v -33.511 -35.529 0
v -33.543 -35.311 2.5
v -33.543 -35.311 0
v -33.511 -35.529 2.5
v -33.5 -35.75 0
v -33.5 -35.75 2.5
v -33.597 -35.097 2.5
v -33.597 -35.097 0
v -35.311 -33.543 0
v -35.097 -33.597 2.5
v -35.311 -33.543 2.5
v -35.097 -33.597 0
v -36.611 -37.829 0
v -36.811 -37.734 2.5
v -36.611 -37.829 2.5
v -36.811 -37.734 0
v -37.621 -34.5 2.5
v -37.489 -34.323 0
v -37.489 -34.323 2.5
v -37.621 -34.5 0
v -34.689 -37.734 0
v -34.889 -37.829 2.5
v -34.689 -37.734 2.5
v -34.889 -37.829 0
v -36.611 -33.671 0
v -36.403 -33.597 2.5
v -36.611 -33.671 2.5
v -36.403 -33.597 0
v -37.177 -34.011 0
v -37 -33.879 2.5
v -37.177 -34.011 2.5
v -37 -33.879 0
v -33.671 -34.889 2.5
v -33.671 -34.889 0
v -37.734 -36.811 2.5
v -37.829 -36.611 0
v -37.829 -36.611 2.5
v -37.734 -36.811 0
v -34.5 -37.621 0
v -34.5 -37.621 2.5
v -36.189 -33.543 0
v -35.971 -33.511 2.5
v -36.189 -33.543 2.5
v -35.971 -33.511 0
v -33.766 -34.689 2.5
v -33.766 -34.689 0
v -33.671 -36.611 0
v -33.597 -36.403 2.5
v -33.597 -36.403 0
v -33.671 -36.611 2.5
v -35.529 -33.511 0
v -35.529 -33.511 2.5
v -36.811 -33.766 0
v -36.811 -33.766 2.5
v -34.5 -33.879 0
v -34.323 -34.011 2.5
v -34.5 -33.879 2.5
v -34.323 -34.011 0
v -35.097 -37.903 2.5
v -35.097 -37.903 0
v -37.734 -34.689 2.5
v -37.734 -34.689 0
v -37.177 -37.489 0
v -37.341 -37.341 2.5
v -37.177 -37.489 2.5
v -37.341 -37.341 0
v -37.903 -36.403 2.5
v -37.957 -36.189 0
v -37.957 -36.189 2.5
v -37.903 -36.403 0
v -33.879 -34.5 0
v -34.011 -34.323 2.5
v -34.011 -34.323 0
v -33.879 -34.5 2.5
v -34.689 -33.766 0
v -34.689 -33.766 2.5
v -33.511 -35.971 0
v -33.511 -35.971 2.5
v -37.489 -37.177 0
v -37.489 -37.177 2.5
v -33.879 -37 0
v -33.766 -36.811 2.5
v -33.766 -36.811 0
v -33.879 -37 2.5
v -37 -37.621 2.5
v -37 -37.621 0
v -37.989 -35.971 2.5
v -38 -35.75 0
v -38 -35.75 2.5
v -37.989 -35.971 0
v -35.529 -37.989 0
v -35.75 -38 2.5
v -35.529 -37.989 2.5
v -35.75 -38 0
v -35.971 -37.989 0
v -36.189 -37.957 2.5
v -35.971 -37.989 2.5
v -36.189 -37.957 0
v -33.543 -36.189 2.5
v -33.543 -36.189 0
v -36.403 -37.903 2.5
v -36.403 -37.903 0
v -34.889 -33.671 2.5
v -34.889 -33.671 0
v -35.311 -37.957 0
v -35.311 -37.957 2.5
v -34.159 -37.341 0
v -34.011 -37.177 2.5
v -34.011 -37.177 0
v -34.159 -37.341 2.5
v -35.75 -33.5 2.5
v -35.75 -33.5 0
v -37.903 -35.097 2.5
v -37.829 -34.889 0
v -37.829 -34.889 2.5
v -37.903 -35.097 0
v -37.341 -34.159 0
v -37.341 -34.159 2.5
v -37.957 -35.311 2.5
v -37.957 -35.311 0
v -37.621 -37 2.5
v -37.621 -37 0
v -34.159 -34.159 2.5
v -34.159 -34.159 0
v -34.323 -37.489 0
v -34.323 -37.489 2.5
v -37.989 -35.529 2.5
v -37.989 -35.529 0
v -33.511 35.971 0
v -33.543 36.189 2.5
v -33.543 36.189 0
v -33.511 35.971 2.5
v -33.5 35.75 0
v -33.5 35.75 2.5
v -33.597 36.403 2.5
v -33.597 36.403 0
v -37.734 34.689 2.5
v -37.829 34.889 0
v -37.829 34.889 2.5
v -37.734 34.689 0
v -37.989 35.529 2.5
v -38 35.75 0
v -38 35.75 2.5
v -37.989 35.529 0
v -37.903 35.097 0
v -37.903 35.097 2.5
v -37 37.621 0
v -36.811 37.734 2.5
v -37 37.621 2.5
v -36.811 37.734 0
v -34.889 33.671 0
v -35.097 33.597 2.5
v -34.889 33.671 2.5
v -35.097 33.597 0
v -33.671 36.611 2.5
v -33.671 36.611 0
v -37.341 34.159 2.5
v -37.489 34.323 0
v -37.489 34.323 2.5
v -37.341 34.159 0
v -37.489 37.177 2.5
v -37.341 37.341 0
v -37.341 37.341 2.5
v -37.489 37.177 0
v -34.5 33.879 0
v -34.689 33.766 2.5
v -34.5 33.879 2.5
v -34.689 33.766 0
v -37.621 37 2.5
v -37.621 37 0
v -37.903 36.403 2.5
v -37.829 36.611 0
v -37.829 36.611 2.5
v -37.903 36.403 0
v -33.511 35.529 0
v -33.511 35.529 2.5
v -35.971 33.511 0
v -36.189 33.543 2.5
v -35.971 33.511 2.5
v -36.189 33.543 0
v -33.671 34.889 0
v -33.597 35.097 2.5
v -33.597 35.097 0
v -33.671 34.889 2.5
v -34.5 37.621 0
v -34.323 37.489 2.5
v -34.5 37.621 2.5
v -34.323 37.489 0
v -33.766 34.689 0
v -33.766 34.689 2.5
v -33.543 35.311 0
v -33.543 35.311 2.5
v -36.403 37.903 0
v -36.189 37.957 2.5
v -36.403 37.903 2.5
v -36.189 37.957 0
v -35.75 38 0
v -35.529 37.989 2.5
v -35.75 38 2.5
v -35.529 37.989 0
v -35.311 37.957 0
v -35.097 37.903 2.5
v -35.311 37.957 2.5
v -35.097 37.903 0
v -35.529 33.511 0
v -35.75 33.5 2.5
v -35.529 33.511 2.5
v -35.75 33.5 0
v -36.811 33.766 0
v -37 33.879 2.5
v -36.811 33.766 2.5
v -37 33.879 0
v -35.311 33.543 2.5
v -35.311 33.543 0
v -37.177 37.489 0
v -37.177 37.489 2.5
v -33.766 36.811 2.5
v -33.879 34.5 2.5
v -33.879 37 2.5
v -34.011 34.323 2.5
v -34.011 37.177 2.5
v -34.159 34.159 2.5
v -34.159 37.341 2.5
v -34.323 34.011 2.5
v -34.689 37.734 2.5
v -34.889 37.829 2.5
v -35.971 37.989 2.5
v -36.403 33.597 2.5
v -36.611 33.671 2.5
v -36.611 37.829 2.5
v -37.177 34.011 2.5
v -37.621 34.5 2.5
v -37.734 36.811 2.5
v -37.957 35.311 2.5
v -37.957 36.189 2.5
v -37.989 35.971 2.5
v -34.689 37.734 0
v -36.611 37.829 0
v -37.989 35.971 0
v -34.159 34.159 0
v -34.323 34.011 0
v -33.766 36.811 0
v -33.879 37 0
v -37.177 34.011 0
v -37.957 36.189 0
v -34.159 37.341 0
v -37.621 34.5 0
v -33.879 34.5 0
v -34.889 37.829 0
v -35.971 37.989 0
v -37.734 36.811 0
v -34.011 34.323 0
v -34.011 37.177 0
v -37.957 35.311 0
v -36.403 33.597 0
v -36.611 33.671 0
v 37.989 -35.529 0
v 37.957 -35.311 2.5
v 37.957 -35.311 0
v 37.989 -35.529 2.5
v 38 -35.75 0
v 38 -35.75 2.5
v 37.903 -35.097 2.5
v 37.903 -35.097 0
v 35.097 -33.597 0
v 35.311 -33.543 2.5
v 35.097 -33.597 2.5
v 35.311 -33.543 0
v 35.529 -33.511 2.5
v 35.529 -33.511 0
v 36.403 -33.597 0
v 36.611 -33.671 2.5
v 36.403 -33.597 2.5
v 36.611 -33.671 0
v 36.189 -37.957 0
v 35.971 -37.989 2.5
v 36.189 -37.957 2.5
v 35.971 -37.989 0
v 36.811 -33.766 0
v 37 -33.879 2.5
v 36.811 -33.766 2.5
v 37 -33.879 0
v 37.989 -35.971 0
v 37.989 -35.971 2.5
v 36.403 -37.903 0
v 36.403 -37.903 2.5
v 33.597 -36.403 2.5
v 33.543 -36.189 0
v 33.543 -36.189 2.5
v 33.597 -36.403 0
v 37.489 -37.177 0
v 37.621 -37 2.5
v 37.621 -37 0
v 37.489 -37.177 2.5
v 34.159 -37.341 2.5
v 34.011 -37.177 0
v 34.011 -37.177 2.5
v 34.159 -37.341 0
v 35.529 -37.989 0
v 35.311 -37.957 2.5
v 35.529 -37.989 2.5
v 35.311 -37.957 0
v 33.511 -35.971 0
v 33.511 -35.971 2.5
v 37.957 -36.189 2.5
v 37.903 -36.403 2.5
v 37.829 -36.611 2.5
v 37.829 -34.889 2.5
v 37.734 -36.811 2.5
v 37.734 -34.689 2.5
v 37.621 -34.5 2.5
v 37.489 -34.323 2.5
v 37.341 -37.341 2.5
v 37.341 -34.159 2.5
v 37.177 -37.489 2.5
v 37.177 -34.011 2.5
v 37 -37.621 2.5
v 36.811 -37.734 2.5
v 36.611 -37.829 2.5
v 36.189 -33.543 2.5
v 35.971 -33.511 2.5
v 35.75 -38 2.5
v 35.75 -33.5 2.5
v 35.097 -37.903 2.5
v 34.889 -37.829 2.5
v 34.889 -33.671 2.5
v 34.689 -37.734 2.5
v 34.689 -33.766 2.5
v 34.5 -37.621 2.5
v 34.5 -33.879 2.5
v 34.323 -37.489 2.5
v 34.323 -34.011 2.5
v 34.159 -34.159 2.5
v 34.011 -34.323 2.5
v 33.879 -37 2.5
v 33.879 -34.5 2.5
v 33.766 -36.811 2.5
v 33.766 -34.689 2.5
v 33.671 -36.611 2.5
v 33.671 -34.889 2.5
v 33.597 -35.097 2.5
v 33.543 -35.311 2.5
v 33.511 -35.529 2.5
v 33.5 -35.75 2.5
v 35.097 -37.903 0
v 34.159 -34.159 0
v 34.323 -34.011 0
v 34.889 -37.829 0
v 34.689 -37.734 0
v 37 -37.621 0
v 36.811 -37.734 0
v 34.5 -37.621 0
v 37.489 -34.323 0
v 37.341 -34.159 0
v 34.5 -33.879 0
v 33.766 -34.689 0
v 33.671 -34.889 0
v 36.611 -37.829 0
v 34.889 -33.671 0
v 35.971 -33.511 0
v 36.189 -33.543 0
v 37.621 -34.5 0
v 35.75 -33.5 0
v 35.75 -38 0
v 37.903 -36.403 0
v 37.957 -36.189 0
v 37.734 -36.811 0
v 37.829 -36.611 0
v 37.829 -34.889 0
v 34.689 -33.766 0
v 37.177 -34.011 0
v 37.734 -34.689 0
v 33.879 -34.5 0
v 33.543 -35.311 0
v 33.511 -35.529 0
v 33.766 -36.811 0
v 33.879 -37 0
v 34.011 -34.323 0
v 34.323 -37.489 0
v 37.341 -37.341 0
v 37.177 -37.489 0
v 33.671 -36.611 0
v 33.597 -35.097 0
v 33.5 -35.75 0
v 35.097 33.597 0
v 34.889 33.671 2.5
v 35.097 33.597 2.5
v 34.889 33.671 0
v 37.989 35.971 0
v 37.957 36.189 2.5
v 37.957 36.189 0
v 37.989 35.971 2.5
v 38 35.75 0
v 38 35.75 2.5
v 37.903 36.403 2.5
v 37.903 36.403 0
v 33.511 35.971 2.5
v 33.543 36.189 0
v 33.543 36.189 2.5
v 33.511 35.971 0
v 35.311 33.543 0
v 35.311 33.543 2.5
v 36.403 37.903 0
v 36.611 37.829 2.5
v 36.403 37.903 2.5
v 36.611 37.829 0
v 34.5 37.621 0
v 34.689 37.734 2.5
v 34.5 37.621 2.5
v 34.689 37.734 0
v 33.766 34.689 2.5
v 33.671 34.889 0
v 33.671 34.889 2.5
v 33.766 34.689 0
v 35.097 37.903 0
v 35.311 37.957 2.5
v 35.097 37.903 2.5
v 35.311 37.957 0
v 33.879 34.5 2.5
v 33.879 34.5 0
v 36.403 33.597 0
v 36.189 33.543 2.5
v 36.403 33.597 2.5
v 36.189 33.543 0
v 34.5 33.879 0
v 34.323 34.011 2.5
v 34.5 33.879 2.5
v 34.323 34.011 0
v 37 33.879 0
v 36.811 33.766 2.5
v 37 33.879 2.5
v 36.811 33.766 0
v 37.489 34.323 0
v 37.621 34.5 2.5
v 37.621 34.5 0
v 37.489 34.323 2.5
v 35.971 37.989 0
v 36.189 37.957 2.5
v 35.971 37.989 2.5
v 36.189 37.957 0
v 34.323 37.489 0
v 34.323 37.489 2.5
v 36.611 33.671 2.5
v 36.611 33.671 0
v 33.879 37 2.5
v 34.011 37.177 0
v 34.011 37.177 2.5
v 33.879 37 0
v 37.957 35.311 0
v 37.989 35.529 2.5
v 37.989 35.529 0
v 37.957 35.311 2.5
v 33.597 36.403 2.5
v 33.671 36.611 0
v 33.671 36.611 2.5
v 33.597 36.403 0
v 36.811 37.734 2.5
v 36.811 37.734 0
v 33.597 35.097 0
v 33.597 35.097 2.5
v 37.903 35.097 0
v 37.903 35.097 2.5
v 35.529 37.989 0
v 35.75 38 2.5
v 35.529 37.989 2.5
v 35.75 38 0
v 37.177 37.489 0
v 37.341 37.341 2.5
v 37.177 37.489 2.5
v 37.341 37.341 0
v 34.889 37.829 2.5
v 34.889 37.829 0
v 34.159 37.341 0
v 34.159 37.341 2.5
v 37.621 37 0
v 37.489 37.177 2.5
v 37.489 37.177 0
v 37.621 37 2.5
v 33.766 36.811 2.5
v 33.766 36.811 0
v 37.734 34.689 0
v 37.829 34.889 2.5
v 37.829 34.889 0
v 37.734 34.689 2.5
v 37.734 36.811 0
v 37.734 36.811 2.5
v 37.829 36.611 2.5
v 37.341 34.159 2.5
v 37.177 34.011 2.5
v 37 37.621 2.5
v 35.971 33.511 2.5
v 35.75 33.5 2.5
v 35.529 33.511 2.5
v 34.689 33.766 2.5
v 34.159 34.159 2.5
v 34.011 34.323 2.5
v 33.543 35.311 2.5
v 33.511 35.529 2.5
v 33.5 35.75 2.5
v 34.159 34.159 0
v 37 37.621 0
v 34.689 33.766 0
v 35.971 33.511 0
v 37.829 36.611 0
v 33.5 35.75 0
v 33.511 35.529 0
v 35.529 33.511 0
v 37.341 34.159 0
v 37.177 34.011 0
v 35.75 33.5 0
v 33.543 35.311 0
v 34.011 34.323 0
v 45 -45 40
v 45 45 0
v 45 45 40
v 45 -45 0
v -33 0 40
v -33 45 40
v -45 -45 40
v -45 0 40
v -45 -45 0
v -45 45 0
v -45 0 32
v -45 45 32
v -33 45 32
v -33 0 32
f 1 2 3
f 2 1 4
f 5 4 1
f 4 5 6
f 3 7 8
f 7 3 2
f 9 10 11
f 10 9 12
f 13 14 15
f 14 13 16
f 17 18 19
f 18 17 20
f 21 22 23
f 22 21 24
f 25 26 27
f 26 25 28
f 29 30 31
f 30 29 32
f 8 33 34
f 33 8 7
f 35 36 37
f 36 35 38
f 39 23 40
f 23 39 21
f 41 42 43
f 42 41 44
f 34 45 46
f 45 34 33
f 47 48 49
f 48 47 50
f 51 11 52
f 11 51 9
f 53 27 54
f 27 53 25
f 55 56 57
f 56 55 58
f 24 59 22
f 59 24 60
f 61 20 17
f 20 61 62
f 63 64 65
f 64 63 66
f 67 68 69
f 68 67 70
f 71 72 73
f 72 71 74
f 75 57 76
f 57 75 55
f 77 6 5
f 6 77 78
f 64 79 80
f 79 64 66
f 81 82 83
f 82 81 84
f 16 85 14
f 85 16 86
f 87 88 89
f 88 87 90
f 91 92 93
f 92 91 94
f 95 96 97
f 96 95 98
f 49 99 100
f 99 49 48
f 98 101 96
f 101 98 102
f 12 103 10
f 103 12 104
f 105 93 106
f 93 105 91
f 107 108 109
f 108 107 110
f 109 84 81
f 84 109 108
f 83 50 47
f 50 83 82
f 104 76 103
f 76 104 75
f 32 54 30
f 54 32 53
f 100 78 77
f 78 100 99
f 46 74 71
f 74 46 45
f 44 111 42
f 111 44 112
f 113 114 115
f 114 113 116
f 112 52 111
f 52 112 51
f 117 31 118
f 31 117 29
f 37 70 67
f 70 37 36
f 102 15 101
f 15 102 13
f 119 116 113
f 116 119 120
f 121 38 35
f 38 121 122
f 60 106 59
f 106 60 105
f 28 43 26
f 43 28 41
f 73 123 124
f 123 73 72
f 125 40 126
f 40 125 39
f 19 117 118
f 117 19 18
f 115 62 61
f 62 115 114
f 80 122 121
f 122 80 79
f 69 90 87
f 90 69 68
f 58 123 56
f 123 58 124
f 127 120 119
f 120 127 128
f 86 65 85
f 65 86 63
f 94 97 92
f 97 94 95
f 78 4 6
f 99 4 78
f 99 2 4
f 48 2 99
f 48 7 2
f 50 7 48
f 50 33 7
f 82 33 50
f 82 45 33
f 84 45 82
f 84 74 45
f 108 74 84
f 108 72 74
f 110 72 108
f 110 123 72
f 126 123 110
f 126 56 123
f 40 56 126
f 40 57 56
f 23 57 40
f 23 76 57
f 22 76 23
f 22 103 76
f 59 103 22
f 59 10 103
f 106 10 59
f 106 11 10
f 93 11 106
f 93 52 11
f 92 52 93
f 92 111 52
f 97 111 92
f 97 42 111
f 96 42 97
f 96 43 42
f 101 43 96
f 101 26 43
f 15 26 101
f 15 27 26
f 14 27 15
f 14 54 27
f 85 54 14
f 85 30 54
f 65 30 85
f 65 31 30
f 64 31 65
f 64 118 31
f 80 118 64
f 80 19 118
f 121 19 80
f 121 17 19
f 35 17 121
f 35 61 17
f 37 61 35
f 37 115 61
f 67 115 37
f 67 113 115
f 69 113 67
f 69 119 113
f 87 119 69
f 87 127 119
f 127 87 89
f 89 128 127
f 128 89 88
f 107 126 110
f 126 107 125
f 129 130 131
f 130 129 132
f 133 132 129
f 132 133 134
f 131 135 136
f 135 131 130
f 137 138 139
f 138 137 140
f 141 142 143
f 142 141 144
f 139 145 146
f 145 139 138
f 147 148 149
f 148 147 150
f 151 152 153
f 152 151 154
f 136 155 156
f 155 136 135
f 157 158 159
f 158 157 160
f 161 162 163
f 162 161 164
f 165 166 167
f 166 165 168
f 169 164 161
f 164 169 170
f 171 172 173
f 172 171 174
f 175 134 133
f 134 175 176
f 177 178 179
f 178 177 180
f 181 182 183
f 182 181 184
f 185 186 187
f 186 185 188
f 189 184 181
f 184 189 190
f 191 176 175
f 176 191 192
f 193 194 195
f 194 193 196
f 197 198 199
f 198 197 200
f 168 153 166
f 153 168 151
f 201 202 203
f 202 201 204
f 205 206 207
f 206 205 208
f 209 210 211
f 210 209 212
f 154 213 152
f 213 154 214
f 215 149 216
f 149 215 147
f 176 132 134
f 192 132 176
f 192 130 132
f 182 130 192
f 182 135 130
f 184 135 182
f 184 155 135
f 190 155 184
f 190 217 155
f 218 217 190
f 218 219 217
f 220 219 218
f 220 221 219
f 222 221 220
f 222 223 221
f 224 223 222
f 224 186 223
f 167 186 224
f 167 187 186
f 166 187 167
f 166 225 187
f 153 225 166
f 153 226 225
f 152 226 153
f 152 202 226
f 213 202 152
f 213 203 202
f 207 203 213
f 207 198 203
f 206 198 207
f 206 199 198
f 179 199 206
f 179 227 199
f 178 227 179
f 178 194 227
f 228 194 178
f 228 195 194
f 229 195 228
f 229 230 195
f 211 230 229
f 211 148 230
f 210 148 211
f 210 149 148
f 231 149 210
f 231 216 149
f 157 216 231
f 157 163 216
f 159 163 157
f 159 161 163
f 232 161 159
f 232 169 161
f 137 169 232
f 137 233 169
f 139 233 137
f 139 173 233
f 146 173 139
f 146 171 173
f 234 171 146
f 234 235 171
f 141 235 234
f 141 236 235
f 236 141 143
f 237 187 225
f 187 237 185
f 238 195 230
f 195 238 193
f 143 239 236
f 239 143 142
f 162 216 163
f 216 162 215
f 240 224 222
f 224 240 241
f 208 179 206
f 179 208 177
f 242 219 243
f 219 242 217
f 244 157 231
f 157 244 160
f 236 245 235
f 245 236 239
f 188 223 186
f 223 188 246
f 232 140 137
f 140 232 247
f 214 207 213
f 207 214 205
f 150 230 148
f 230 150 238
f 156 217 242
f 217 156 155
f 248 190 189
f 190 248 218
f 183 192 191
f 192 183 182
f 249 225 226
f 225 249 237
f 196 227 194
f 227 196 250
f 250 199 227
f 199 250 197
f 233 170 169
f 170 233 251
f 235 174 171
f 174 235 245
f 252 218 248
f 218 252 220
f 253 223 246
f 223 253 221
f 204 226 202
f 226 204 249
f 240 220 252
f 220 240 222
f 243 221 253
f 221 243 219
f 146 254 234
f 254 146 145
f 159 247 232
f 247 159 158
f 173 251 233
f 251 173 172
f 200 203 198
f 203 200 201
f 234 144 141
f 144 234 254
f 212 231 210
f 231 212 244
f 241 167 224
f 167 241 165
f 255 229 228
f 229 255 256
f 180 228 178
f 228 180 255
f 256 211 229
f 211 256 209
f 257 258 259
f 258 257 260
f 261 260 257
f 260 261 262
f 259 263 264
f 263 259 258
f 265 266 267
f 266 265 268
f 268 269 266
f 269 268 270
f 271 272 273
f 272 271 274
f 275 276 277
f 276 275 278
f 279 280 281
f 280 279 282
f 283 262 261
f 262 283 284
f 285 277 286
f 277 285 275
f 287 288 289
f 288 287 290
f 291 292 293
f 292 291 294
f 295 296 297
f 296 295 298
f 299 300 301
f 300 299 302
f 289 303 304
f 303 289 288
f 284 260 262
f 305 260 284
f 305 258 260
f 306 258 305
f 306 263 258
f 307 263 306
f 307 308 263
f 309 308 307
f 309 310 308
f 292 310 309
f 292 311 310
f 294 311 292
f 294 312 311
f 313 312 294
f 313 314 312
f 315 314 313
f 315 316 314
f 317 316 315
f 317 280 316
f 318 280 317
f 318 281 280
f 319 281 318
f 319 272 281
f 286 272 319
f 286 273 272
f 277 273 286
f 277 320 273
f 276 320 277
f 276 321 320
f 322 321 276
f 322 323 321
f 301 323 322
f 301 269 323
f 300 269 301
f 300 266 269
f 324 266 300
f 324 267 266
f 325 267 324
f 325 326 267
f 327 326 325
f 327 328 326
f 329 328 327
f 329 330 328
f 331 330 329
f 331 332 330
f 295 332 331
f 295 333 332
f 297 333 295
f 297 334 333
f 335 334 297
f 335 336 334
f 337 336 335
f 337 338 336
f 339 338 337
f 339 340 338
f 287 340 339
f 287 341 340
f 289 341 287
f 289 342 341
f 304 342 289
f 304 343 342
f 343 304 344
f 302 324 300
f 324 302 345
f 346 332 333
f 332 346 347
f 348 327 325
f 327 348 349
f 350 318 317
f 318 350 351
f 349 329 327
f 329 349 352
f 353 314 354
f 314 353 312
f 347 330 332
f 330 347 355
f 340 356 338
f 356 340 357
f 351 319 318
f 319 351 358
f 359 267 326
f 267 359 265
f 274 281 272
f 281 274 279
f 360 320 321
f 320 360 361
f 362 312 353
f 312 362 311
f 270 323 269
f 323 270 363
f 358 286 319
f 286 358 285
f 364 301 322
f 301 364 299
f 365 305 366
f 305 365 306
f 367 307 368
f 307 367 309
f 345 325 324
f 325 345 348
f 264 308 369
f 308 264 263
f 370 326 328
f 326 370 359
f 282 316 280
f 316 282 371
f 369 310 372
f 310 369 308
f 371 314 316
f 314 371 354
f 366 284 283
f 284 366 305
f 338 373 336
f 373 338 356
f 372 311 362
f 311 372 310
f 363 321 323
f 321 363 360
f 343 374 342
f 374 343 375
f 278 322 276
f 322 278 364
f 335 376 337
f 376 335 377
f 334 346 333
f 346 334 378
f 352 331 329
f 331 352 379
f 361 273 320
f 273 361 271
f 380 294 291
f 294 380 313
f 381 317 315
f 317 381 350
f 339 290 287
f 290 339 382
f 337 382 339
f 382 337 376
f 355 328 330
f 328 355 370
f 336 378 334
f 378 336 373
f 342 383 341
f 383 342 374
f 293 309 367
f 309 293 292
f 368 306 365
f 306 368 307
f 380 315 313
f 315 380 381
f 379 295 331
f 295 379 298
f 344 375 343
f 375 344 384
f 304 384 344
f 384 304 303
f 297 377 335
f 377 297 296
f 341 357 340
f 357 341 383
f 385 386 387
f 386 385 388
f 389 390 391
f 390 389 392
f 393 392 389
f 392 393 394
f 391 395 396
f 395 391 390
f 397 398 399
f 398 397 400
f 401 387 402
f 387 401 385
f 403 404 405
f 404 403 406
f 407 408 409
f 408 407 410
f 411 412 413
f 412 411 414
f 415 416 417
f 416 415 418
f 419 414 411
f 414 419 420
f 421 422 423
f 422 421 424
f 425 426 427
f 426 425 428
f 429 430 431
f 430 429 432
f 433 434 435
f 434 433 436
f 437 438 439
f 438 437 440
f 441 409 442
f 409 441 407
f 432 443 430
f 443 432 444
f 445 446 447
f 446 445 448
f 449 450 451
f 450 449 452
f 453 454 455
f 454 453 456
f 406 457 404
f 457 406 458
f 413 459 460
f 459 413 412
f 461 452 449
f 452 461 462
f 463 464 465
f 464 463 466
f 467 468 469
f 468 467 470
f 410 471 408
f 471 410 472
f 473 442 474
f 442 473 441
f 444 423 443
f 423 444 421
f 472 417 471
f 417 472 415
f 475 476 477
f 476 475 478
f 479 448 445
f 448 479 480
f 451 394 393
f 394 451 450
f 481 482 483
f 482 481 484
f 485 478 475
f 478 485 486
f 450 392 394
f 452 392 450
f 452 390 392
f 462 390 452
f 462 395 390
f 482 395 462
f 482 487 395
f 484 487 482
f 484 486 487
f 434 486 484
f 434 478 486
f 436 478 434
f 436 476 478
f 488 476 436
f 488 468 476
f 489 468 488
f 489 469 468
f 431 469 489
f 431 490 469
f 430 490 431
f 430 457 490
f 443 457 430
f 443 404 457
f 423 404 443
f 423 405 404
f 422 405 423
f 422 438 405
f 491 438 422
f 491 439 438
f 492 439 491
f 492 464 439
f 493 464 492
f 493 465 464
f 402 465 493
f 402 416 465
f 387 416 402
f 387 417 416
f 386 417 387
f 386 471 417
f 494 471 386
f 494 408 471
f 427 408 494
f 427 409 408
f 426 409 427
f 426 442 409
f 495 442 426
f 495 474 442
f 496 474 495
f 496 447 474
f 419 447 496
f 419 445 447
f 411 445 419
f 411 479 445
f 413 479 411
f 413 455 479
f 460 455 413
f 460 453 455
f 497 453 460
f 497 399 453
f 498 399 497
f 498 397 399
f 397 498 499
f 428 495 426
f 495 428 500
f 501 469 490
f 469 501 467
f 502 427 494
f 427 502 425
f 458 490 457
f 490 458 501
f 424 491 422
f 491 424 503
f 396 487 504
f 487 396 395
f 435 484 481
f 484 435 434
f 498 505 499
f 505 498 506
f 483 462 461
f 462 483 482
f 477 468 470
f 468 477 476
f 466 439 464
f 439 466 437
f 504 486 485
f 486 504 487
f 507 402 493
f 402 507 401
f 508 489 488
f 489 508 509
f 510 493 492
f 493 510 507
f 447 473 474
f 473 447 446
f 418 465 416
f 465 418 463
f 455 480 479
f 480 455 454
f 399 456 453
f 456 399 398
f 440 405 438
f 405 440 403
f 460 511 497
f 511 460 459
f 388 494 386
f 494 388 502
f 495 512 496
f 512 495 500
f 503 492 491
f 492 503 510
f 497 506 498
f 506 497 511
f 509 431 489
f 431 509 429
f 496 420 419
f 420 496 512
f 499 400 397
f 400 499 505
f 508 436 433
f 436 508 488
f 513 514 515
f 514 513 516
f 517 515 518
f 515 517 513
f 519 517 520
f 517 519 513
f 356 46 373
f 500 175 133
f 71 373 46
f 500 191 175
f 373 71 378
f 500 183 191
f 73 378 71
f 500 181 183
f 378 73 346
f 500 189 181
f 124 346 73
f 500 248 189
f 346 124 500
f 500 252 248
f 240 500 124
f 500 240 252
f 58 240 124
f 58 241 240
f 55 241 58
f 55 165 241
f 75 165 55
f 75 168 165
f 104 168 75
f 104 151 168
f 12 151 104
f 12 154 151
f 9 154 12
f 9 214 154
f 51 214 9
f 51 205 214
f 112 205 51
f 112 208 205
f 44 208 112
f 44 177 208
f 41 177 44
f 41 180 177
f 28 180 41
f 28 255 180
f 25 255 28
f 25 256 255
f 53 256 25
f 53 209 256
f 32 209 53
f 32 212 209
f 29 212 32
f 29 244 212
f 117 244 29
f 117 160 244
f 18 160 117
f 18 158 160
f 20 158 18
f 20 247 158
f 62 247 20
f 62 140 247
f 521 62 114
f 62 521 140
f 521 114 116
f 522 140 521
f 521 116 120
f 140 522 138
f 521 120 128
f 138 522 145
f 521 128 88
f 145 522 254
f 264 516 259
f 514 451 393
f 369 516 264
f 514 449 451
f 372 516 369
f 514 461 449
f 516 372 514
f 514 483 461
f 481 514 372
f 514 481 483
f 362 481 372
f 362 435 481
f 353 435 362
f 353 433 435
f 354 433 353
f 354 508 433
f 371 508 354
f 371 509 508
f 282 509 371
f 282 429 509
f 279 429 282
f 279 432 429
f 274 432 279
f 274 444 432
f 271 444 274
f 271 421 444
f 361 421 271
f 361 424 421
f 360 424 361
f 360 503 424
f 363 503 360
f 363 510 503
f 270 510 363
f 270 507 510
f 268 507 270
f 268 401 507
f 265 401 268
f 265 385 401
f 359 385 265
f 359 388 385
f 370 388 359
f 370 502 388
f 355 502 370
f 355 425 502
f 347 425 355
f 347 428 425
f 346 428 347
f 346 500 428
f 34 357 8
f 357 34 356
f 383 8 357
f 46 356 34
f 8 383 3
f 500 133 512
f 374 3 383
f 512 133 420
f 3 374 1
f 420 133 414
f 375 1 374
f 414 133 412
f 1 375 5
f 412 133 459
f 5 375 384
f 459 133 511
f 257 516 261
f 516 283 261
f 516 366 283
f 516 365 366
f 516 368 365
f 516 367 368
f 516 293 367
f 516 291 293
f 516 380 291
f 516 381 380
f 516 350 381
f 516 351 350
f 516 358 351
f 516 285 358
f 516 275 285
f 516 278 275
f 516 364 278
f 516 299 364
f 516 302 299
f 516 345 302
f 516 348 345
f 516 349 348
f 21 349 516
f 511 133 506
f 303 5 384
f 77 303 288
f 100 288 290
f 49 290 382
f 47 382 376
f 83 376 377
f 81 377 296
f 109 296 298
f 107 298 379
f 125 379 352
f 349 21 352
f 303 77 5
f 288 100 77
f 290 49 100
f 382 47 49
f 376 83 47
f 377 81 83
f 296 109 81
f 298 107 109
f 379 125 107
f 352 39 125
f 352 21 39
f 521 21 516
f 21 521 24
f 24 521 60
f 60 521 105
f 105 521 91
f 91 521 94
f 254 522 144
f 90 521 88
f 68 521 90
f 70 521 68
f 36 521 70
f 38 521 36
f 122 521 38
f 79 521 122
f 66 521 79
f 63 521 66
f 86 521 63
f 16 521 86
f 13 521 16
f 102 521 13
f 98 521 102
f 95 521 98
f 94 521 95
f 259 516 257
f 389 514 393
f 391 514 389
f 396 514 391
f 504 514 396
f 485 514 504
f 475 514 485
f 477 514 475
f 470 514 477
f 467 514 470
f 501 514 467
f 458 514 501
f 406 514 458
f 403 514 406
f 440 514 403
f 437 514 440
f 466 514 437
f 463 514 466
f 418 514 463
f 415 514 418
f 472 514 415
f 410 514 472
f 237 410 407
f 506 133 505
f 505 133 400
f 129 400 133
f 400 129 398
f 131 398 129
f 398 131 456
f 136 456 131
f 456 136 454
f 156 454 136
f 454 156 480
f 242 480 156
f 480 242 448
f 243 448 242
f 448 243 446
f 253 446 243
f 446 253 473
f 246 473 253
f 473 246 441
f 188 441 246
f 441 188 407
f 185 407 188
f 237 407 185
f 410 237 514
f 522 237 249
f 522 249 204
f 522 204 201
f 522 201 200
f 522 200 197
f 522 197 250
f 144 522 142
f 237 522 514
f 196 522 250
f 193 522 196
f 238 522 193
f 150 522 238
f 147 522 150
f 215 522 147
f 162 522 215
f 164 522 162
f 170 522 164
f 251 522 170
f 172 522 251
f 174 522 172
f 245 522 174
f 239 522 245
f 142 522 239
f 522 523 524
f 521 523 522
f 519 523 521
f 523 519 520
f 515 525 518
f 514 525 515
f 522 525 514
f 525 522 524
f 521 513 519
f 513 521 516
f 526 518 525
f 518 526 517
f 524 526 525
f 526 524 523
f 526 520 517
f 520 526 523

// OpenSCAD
// Magnetic stirrer housing for 80 mm PC case fan
// Print orientation: top plate on bed (z = 0), walls build upward (+Z)

// ---------- Dimensions (mm) ----------
plate_t      = 2;     // top plate thickness
wall_t       = 2.5;   // wall thickness
box_h        = 40;    // total height of box (open top)
outer_x      = 90;    // outer size in X
outer_y      = 90;    // outer size in Y
hole_d       = 4.5;   // M4 screw hole diameter
hole_pitch   = 71.5;  // square pattern centre-to-centre spacing
notch_w      = 12;    // cable notch width
notch_depth  = 8;     // notch depth from open edge (z = 32 to 40)
eps          = 0.5;   // cutter overshoot past faces

$fn = 64;

// ---------- Model ----------
difference() {
    // Outer box body: open top, solid base
    translate([-outer_x / 2, -outer_y / 2, 0])
        cube([outer_x, outer_y, box_h]);

    // Four screw holes through the top plate
    for (sx = [-1, 1], sy = [-1, 1])
        translate([sx * hole_pitch / 2, sy * hole_pitch / 2, -eps])
            cylinder(d = hole_d, h = plate_t + 2 * eps);

    // Cable notch in one wall, centred along X
    translate([-outer_x / 2, 0, box_h - notch_depth])
        cube([notch_w, outer_y, notch_depth + eps]);
}
